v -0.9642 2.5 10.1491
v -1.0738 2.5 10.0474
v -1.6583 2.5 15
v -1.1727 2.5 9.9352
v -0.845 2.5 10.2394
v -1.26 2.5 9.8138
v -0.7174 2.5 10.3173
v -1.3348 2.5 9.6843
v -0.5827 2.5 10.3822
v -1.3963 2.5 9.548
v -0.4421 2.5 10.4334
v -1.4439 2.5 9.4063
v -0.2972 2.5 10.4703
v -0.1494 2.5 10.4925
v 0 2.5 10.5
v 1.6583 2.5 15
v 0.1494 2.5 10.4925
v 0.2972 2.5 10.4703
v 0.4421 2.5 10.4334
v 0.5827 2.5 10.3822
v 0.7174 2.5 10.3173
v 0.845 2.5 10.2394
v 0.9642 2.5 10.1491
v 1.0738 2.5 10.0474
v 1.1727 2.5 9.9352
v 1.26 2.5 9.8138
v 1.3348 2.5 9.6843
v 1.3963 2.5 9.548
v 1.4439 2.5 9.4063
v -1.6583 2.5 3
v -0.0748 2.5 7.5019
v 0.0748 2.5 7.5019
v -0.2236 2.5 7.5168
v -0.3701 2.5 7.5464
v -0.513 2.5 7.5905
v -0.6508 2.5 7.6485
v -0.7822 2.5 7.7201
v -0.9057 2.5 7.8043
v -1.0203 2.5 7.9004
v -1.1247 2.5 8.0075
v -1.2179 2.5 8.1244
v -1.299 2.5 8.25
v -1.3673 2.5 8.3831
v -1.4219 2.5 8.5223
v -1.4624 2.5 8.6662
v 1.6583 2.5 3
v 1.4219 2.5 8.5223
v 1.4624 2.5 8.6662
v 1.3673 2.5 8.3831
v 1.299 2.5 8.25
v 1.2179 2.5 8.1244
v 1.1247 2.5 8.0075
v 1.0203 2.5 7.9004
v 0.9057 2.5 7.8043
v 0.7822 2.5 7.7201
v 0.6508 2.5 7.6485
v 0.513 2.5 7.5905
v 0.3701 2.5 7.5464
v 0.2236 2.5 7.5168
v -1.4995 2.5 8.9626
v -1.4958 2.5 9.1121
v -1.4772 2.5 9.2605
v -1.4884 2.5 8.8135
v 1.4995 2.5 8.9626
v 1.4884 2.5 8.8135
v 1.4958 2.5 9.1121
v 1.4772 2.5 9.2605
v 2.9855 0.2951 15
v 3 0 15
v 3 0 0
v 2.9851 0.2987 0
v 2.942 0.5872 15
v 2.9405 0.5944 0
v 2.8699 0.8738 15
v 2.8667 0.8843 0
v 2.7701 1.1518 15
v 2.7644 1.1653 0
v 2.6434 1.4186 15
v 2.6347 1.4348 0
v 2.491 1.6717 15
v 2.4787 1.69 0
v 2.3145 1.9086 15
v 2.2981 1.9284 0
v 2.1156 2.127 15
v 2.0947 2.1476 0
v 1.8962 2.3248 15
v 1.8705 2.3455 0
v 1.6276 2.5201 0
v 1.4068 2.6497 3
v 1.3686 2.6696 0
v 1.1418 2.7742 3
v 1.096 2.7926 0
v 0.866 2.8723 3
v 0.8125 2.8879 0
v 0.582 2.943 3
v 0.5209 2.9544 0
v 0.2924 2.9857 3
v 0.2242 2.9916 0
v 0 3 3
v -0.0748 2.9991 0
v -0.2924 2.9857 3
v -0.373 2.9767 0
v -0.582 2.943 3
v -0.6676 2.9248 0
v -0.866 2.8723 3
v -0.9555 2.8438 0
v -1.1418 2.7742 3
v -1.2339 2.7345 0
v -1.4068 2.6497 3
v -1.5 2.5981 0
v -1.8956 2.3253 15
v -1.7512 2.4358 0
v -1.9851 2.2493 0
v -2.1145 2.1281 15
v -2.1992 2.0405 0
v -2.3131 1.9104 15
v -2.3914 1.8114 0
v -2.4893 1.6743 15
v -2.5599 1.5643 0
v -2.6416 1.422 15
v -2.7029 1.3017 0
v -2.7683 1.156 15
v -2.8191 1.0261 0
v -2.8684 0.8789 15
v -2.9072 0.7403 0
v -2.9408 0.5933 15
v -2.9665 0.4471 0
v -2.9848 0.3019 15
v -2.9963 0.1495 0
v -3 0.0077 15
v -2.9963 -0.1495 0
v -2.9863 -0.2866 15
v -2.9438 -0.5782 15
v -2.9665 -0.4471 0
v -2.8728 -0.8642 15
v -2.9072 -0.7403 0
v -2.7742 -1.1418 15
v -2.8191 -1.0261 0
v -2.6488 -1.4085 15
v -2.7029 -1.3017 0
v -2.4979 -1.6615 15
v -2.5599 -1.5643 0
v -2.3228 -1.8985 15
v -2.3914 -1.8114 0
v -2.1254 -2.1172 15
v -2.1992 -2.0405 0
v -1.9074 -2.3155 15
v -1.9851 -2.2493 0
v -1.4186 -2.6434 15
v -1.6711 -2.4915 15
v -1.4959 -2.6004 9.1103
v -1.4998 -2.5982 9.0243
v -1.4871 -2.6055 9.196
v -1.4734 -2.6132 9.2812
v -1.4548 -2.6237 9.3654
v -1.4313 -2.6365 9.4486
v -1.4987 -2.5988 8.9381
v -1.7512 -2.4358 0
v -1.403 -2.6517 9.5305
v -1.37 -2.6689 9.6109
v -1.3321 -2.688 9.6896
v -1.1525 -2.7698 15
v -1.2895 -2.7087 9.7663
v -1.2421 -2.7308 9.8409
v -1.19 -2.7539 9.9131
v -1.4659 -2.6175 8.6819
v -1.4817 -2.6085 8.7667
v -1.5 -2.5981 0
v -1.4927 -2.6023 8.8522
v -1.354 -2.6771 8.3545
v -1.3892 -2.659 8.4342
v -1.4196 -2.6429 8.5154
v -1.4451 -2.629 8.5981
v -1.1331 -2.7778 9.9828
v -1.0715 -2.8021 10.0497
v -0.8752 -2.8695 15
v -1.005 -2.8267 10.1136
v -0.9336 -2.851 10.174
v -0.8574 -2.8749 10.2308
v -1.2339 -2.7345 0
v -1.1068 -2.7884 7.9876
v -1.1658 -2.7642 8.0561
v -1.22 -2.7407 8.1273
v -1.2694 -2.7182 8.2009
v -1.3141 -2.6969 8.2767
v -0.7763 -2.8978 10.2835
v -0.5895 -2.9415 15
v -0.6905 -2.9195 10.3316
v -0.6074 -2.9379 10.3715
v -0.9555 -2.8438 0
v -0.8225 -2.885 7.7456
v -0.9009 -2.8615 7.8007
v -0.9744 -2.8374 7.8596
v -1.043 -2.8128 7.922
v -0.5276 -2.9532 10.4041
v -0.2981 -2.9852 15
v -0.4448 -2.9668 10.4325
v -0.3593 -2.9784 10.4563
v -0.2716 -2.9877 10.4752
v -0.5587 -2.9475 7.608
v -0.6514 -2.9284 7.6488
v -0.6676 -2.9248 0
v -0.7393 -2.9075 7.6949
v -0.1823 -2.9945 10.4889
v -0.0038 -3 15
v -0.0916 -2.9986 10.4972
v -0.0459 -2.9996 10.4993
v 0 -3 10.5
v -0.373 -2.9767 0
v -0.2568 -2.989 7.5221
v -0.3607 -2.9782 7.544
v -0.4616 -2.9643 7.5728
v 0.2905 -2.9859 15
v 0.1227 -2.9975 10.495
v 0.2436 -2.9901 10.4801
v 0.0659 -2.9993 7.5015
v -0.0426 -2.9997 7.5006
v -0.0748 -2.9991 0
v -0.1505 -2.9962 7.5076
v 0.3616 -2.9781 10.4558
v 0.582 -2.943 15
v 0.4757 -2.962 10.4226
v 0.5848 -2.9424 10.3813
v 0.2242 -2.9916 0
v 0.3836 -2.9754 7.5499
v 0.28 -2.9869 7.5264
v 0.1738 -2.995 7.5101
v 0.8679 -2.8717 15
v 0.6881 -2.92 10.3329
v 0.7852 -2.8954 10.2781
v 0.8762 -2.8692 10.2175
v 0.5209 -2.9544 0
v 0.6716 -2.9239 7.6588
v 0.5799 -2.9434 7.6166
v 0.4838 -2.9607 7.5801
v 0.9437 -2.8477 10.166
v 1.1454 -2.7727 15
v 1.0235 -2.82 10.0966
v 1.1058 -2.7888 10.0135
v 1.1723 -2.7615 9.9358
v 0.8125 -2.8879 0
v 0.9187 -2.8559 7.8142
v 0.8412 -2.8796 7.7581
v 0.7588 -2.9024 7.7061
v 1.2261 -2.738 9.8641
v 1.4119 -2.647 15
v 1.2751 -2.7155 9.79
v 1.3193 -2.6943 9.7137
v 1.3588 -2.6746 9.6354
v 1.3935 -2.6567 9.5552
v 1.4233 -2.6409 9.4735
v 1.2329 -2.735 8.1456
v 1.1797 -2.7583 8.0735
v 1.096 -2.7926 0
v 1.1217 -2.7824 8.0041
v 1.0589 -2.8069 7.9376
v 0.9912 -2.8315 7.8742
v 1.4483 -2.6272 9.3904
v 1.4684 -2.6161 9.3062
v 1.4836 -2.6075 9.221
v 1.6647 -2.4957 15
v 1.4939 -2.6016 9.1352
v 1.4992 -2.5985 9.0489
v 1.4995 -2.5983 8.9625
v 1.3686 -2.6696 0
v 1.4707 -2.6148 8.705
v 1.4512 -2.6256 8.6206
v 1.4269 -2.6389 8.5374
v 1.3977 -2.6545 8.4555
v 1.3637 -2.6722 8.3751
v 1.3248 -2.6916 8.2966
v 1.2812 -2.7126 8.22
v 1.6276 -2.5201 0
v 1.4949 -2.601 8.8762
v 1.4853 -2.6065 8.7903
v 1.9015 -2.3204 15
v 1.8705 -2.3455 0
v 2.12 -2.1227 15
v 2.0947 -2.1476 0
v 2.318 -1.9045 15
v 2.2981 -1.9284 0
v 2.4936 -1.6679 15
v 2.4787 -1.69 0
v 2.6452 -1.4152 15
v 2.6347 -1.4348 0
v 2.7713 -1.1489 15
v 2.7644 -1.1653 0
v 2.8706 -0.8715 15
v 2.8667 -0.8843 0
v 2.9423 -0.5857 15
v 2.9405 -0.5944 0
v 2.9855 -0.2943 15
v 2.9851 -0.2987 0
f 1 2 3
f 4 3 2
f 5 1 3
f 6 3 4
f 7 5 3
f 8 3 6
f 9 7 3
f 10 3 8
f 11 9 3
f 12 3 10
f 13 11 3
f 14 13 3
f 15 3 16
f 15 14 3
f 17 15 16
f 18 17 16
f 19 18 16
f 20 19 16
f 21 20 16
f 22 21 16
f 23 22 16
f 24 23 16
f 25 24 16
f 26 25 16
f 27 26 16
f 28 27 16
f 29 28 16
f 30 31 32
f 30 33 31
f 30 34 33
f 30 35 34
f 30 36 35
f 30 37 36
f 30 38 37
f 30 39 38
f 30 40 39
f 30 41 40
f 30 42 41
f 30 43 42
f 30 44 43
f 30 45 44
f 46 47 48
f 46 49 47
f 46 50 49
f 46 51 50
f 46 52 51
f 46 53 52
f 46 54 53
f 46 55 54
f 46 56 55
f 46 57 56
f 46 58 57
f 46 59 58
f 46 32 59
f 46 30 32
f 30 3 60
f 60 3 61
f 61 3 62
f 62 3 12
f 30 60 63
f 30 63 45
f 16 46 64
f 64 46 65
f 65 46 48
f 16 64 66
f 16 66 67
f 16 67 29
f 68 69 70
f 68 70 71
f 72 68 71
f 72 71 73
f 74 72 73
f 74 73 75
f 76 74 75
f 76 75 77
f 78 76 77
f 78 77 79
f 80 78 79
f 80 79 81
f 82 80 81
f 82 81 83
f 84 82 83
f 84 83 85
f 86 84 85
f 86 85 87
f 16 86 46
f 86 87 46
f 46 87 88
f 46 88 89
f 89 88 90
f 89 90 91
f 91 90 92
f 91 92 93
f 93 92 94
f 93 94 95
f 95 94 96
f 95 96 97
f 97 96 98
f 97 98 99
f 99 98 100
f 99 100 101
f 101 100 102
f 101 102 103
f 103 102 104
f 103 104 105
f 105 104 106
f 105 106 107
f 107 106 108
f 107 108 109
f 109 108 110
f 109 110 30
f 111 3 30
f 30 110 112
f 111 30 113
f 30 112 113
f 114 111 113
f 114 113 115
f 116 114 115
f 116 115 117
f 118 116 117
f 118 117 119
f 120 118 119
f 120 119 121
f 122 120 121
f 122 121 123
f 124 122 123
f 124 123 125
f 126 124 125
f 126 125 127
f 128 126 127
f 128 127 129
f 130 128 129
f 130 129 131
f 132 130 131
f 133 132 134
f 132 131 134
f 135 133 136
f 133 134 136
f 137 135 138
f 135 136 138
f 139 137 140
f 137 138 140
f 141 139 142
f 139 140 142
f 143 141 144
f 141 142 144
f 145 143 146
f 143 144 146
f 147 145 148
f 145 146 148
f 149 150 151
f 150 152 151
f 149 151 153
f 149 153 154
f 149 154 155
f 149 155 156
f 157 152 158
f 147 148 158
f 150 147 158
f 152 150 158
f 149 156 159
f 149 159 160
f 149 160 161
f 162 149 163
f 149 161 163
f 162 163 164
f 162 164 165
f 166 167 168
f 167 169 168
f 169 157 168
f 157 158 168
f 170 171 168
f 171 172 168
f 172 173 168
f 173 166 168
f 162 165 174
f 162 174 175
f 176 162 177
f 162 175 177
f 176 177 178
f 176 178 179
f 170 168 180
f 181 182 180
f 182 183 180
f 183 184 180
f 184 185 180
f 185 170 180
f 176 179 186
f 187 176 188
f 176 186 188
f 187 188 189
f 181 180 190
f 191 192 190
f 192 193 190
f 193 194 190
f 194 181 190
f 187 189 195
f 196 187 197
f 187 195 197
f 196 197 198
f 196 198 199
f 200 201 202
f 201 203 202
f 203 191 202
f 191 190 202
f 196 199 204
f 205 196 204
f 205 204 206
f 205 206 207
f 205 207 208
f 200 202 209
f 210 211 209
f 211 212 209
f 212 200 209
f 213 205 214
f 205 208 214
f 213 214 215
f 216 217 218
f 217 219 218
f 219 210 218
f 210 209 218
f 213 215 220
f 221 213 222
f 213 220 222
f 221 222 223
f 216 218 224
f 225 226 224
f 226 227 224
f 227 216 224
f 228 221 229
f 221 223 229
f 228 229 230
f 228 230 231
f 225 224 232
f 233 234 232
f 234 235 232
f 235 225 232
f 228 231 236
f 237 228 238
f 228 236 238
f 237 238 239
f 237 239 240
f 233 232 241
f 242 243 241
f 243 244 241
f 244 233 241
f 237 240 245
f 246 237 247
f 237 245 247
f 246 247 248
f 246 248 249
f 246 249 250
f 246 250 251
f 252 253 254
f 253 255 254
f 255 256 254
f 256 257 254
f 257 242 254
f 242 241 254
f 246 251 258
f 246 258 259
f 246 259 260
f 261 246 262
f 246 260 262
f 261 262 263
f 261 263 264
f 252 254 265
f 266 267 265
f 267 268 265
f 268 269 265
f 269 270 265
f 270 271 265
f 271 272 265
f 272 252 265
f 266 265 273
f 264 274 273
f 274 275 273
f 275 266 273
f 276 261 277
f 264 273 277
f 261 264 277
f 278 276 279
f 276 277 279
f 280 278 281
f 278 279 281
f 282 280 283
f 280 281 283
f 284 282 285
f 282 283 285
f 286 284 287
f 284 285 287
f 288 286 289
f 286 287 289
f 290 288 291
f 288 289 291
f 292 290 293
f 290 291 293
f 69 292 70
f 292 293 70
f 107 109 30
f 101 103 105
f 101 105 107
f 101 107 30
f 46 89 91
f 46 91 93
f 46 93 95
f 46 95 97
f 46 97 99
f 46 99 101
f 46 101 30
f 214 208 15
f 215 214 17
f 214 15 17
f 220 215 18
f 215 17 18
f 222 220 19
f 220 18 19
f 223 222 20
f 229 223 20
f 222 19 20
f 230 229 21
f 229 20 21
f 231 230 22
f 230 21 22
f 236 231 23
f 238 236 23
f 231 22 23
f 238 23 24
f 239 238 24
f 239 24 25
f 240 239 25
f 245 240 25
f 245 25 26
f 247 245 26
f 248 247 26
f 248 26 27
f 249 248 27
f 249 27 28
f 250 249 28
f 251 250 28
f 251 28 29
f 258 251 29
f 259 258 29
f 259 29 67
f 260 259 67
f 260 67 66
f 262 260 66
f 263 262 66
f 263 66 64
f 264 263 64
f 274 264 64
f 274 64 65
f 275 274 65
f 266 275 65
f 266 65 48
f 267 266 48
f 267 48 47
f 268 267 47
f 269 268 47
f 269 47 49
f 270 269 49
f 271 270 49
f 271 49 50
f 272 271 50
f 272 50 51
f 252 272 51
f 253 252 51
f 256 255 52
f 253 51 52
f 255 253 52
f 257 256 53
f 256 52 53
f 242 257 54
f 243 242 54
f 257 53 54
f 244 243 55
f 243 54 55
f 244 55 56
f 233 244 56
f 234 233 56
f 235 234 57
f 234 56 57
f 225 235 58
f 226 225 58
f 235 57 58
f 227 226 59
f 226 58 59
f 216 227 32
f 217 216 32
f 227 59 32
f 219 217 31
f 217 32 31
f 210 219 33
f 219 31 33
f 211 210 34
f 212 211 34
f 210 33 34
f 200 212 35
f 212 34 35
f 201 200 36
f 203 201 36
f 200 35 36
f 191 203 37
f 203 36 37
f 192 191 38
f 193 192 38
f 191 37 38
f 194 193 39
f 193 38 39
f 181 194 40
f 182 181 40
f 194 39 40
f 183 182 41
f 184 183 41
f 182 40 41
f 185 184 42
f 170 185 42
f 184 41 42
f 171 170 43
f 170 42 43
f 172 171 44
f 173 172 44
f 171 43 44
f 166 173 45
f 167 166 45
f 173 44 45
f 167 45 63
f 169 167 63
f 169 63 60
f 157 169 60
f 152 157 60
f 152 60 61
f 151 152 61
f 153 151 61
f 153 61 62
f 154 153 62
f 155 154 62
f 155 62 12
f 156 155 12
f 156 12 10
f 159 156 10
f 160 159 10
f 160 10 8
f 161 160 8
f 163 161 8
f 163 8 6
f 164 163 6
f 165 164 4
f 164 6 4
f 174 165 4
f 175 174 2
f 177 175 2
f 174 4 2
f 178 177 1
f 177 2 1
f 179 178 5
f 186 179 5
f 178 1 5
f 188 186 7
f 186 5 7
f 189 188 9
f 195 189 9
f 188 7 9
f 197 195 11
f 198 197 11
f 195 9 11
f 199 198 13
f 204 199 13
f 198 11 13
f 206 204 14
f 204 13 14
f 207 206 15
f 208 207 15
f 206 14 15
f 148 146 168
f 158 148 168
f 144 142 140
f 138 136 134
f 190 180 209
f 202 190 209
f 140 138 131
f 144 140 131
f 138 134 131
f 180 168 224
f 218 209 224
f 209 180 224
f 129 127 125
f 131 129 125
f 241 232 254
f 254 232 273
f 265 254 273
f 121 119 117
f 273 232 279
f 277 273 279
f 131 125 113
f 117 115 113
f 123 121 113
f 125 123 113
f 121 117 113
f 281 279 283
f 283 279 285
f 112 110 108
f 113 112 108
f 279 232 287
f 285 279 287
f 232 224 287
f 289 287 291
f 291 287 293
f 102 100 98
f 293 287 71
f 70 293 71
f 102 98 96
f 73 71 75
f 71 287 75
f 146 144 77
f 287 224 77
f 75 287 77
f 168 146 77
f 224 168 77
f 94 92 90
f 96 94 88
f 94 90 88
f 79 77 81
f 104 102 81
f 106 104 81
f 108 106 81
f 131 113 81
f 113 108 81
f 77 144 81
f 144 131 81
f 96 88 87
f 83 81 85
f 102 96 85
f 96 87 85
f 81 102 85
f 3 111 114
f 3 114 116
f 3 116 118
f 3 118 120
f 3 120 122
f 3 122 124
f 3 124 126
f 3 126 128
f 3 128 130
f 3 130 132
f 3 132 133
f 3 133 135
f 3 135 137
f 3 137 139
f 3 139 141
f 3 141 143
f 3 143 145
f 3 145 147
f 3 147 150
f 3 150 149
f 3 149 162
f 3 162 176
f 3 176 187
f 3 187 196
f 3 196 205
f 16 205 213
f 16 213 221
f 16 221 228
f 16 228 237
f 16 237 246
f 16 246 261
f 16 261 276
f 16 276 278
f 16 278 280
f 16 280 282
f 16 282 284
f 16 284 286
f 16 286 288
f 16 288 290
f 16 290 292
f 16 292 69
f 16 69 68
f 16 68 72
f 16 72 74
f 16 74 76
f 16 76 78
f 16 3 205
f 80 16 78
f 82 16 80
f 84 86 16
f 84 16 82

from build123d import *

# Parameters (mm, degrees)
SKETCH1_R           = 3
BOSS_EXTRUDE1_DEPTH = 15
CUT_EXTRUDE1_START  = -12
CUT_EXTRUDE1_DEPTH  = 12
SKETCH3_R           = 1.5
CUT_EXTRUDE2_DEPTH  = 6


with BuildPart() as part:
    # Sketch1 → Boss-Extrude1 (new body)
    with BuildSketch(Plane.XY):
        Circle(SKETCH1_R)
    extrude(amount=BOSS_EXTRUDE1_DEPTH)

    # Sketch2 → Cut-Extrude1 (cut)
    with BuildSketch(Plane.XY.offset(15).offset(CUT_EXTRUDE1_START)):
        with BuildLine():
            Line((-1.658312395, 2.5), (1.658312395, 2.5))
            ThreePointArc((1.658312395, 2.5), (0, 3), (-1.658312395, 2.5))
        make_face()
    extrude(amount=CUT_EXTRUDE1_DEPTH, mode=Mode.SUBTRACT)

    # Sketch3 → Cut-Extrude2 (cut)
    with BuildSketch(Plane(origin=(0, 2.5, 0), x_dir=(1, 0, 0), z_dir=(0, 1, 0))):
        with Locations(Location((0, -9, 0), (0, 0, 270))):
            Circle(SKETCH3_R)
    extrude(amount=-CUT_EXTRUDE2_DEPTH, mode=Mode.SUBTRACT)


solid = part.part
